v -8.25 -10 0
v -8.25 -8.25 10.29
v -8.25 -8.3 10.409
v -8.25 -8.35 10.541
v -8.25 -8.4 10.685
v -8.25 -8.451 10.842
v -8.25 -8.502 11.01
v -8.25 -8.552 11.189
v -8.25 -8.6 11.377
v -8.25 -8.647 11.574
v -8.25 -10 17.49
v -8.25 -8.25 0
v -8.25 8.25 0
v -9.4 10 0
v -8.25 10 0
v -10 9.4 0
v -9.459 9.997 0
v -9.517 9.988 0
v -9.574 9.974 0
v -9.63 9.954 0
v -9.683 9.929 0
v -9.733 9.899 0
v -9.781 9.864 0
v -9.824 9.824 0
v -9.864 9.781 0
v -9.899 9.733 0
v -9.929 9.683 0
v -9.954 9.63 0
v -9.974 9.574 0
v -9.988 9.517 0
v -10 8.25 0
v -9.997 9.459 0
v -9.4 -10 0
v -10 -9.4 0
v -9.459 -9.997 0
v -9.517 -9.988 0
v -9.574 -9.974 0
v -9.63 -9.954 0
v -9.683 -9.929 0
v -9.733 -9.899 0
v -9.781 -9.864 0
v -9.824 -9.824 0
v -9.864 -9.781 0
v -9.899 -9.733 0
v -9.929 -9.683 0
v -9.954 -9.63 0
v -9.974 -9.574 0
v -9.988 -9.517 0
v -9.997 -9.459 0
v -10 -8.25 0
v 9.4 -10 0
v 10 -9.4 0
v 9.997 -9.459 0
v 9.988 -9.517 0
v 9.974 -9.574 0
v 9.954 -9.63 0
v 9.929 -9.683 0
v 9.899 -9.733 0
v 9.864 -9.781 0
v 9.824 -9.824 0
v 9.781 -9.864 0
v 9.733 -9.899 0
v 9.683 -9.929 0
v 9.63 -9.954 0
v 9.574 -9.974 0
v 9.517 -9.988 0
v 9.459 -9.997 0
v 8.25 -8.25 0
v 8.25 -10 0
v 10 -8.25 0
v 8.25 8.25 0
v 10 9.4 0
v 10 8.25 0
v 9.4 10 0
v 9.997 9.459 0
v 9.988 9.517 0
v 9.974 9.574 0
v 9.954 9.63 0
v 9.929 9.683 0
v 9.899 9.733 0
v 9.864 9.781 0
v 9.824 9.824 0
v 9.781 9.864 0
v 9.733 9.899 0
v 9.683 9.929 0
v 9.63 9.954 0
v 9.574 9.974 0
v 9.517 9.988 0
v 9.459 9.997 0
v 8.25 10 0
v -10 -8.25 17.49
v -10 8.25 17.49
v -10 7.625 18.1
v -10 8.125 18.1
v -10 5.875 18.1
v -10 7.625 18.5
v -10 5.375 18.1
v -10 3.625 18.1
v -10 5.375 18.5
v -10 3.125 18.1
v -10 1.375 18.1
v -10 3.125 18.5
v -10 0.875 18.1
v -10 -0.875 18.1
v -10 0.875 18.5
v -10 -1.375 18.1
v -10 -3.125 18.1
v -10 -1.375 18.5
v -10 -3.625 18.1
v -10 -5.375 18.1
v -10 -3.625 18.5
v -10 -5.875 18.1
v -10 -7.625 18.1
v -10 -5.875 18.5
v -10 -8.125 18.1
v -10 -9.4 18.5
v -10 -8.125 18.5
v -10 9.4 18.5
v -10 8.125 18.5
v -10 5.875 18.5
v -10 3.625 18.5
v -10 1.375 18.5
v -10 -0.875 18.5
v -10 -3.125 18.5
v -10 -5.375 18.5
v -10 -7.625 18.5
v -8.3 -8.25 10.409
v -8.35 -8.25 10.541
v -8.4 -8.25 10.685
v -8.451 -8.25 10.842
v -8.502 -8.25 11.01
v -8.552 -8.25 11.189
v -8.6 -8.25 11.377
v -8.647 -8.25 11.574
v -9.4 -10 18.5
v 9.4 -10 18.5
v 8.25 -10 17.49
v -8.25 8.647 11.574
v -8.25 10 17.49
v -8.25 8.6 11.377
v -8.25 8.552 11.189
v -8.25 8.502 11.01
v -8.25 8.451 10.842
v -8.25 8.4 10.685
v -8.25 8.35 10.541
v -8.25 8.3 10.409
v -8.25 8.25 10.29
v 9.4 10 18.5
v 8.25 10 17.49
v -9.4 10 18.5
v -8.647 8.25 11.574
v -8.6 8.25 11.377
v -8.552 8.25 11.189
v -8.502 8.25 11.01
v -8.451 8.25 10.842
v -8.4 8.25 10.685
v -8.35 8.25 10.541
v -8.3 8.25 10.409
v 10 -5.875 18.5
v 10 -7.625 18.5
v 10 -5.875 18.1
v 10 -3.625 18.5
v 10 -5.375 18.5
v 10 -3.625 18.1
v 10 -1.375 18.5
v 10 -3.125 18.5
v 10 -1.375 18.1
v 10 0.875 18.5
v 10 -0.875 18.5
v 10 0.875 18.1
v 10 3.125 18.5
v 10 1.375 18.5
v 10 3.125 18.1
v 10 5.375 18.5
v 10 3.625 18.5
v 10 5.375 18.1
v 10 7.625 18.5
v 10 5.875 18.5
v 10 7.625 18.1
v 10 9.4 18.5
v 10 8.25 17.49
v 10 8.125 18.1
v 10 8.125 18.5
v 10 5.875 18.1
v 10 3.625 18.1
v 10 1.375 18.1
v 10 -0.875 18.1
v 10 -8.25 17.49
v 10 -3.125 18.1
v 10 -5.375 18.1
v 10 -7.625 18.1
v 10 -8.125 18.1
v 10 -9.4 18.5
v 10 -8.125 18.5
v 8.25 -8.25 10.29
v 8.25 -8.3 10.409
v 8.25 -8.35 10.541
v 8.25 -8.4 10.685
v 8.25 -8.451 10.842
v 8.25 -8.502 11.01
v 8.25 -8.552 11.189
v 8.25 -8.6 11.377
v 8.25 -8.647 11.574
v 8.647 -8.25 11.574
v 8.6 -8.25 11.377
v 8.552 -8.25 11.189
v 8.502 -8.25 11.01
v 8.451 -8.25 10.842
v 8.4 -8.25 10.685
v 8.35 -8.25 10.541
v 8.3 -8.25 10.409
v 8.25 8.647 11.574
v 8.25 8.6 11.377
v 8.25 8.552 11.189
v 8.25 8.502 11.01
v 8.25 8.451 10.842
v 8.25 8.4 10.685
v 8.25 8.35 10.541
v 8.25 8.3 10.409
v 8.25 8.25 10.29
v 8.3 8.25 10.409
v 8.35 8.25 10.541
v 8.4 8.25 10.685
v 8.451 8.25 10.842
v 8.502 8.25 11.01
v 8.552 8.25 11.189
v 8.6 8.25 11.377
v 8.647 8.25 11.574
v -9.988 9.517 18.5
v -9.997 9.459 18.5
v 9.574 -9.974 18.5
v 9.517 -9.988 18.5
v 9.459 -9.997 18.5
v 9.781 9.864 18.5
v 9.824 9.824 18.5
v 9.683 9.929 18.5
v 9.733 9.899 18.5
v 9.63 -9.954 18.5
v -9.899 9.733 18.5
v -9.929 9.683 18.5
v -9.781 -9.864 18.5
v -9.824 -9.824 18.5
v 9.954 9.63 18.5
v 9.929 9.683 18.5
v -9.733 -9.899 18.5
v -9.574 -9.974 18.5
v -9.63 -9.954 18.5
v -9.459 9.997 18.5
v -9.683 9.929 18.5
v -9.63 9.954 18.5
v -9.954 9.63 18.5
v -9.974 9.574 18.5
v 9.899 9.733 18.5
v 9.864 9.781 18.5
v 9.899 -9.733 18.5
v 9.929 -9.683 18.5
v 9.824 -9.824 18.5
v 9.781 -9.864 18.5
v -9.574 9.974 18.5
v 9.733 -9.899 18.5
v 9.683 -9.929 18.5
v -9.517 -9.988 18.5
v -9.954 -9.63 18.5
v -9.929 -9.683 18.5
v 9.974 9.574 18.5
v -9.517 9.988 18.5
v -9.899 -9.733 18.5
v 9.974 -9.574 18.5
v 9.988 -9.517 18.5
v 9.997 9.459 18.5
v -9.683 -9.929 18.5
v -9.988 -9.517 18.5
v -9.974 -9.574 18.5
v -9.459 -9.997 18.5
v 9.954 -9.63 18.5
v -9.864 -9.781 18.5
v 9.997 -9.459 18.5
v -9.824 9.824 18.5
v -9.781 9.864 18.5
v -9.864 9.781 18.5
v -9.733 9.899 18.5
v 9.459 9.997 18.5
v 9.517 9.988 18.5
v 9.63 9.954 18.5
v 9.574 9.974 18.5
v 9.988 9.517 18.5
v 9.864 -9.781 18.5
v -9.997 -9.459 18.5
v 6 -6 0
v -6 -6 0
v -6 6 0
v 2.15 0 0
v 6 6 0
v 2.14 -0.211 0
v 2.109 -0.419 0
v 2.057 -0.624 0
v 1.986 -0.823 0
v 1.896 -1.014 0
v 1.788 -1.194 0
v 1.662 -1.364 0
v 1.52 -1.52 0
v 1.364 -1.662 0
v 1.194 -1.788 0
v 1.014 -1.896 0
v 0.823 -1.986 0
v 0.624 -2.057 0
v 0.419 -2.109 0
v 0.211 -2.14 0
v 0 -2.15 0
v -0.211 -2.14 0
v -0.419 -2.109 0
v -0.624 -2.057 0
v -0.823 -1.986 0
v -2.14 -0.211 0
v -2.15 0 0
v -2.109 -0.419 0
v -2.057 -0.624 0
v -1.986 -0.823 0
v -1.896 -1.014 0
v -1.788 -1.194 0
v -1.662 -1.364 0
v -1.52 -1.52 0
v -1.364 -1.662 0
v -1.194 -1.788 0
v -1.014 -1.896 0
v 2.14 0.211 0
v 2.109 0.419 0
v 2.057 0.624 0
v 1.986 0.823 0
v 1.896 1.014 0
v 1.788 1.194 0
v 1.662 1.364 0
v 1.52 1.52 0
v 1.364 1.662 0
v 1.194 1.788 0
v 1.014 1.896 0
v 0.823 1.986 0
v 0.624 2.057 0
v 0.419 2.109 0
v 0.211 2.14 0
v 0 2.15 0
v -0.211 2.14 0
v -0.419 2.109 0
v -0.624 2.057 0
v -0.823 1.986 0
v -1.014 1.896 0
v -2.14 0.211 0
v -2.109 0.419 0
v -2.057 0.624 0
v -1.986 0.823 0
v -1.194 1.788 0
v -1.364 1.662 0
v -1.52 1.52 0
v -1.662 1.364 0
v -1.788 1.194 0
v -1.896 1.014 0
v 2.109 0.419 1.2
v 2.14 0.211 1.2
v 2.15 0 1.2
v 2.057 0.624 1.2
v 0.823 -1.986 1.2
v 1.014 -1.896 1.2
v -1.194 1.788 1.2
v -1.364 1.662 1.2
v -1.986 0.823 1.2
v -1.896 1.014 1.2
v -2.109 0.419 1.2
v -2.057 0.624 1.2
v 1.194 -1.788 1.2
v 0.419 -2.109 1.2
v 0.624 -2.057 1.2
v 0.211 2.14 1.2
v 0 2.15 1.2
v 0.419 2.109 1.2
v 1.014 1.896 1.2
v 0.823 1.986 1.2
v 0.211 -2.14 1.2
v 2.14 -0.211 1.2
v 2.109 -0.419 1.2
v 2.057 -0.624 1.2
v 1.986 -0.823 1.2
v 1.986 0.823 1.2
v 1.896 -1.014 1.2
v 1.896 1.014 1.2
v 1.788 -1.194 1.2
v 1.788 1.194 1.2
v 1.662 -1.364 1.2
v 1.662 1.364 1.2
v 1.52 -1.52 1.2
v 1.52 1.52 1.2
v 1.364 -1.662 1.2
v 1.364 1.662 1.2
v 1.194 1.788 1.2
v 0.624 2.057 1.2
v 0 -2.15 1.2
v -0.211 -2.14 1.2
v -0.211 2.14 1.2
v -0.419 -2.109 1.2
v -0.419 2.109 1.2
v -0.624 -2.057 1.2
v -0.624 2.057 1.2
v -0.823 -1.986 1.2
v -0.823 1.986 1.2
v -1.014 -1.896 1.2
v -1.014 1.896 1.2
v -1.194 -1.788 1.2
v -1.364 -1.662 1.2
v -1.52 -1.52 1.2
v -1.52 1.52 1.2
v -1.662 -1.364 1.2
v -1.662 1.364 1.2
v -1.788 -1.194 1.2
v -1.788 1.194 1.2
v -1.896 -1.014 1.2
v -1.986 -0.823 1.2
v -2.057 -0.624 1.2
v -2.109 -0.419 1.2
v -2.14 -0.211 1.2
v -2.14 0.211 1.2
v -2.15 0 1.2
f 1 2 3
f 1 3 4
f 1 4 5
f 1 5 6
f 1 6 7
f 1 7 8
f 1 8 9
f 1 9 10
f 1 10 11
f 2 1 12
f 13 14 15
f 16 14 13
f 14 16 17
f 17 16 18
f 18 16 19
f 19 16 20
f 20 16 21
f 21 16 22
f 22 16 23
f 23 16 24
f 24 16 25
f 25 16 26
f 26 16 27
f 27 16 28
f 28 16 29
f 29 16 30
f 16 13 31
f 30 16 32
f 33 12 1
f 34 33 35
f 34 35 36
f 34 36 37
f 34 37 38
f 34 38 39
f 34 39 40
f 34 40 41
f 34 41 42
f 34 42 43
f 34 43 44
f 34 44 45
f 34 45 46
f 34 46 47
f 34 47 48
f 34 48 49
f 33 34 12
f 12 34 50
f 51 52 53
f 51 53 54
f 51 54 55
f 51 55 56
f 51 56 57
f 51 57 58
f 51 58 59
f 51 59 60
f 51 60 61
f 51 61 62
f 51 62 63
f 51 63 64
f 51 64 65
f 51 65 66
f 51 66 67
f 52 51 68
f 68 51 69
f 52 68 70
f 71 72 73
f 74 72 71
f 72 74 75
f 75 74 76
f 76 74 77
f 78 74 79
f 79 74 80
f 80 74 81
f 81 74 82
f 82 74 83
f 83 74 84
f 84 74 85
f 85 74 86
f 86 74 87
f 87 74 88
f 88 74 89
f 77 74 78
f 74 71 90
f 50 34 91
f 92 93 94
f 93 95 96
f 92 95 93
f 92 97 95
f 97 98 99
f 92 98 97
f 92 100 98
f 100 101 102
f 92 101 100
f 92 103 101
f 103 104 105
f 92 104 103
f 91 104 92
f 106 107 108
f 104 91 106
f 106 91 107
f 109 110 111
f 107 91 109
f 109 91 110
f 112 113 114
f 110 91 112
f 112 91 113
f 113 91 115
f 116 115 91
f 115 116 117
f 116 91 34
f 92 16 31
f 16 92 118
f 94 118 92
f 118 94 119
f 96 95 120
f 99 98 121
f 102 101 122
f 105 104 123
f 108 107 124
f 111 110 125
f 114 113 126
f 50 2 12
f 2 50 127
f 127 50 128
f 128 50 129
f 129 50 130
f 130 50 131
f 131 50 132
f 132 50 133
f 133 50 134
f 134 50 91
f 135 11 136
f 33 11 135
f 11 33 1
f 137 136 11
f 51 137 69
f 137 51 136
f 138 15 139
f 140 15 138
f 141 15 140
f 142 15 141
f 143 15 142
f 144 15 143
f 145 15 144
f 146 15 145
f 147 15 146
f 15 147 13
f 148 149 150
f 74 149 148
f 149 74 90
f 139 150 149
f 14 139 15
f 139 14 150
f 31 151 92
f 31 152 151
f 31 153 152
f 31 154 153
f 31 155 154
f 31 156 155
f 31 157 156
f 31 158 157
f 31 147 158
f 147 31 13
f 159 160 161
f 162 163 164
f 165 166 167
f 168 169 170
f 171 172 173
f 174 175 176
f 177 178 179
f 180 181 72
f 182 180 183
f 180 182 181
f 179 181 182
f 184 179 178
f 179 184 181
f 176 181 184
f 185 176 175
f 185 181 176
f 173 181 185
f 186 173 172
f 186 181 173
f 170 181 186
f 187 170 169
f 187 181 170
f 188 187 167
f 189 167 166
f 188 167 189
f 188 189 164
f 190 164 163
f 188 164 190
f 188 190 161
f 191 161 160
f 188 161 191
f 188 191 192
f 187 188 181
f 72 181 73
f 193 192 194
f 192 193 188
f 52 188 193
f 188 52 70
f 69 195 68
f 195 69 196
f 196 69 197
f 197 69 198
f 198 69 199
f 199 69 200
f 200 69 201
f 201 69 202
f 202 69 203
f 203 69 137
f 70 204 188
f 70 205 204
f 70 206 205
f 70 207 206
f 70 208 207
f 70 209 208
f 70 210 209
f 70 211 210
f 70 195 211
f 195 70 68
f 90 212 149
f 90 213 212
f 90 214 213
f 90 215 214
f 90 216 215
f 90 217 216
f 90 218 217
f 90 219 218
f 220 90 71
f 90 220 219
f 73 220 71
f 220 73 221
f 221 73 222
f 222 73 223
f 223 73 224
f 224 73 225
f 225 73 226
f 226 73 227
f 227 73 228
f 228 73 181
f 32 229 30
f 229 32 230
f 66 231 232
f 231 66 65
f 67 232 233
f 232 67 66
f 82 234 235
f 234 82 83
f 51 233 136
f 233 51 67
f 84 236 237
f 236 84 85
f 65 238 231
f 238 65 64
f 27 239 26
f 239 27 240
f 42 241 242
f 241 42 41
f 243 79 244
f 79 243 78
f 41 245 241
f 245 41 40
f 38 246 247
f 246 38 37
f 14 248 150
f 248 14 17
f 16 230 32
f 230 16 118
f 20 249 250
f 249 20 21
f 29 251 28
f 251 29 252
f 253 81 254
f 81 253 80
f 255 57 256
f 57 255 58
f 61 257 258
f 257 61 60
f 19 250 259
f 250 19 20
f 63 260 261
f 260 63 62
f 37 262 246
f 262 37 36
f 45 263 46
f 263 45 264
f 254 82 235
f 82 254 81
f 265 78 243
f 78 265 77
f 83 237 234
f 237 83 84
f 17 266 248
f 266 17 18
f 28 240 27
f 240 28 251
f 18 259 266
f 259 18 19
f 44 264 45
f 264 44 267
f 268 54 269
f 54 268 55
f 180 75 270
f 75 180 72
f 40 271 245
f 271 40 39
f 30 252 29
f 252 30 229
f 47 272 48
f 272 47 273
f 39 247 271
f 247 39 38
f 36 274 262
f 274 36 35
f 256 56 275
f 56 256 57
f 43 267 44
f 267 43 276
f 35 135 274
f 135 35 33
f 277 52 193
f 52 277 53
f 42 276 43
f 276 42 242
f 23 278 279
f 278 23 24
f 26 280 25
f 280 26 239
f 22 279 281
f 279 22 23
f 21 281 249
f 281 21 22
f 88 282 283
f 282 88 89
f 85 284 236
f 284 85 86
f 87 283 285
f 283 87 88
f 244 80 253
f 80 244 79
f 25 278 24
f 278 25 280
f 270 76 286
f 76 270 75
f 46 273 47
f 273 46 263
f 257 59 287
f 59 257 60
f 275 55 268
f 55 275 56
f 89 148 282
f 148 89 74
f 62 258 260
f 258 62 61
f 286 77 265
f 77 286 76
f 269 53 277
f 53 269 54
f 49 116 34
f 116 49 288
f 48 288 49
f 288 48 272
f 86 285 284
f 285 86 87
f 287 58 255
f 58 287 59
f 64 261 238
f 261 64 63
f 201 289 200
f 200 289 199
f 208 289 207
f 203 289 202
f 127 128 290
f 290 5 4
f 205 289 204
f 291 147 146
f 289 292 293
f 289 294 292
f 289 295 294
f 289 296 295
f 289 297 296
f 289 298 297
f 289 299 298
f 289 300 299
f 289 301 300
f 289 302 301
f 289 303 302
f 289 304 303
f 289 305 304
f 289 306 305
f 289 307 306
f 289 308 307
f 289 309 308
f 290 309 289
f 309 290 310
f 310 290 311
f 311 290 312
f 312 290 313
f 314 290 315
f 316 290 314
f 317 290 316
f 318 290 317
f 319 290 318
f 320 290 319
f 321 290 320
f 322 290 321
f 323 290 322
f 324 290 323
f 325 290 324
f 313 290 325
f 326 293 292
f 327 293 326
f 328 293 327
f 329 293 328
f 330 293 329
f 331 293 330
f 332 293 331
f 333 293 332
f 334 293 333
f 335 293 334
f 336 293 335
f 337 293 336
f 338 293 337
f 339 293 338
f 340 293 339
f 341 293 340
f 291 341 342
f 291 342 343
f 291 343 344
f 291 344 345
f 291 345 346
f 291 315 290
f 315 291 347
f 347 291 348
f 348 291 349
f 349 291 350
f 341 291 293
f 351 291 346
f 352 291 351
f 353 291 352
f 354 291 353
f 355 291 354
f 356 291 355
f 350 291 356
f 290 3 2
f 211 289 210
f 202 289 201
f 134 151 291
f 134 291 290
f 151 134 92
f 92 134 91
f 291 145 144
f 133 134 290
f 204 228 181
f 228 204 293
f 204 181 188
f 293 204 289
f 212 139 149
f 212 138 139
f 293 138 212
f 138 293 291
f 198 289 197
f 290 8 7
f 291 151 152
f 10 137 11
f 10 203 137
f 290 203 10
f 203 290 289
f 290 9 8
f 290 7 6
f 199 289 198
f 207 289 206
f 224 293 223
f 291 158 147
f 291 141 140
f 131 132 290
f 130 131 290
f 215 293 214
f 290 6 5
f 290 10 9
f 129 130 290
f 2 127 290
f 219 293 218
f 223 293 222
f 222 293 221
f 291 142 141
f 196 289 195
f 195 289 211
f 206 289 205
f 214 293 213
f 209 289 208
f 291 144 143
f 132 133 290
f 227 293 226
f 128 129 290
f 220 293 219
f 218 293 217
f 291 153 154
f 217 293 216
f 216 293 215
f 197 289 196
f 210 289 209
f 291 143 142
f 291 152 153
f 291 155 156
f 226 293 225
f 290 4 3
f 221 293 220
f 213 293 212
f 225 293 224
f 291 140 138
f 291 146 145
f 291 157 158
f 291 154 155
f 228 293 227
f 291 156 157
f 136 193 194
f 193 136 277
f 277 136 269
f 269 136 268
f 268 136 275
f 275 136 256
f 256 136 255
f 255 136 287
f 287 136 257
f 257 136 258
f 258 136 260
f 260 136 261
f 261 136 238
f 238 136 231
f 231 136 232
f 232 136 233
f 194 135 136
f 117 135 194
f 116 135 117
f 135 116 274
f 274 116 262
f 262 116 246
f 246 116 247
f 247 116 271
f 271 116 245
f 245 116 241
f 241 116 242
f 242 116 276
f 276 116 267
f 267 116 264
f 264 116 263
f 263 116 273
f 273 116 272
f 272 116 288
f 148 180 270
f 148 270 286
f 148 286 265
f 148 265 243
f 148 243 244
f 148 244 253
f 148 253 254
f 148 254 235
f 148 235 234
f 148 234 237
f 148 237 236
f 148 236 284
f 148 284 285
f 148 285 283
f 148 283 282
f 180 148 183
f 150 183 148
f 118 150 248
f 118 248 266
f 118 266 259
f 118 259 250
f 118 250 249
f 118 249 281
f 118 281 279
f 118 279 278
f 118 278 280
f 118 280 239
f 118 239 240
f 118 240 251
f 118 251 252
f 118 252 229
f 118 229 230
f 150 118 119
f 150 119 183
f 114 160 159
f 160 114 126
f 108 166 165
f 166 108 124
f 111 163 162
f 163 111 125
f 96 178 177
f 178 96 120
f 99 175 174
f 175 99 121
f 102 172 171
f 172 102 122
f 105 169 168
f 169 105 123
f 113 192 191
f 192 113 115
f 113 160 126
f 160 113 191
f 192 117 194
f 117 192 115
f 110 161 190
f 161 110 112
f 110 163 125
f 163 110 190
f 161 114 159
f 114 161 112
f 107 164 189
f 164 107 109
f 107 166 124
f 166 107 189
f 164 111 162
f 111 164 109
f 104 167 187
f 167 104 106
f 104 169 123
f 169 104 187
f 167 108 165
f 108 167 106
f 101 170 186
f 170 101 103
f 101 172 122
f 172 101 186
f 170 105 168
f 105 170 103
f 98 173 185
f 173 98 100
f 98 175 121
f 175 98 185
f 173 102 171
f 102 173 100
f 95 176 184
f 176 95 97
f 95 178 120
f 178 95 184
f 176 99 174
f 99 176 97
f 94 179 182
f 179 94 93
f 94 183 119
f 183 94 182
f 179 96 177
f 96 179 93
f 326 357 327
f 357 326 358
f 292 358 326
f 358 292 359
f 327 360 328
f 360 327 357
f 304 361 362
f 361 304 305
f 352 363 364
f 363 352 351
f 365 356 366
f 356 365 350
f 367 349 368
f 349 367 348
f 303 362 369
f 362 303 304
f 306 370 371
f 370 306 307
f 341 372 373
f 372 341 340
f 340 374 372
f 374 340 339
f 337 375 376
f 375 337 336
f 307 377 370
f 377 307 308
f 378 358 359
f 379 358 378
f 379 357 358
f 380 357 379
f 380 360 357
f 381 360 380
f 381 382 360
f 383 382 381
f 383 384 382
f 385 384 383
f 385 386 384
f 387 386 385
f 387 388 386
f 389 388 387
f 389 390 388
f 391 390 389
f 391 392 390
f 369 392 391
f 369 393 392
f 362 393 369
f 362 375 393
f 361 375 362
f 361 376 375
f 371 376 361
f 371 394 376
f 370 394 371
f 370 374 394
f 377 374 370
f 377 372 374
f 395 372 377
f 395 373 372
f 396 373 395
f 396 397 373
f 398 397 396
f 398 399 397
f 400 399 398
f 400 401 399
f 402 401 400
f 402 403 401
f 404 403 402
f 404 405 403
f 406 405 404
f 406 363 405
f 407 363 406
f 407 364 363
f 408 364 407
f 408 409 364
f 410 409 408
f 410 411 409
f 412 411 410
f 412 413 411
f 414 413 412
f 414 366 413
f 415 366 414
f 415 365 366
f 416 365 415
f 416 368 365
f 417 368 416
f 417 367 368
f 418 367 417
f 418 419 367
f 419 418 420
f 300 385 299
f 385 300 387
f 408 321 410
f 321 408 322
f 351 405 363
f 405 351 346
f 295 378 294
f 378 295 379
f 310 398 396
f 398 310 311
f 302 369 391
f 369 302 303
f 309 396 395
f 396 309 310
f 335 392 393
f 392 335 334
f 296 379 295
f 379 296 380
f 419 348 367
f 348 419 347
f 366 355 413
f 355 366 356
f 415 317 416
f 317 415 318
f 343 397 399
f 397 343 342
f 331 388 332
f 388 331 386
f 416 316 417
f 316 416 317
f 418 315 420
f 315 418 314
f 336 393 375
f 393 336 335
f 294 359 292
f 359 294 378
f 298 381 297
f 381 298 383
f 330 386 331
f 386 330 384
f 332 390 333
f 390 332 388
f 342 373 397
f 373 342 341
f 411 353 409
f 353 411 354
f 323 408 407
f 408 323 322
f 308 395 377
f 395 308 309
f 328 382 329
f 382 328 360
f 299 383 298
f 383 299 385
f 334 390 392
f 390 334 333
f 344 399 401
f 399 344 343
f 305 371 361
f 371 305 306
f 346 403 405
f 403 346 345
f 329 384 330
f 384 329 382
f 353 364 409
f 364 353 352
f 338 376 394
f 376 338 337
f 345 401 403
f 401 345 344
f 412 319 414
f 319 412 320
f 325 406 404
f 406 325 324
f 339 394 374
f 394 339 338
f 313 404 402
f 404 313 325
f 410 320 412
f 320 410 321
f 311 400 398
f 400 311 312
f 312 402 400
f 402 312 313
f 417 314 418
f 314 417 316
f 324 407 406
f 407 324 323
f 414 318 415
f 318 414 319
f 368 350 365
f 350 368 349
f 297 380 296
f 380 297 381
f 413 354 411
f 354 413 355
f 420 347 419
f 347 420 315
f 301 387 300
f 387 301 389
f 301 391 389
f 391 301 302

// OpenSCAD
// outdoor / table — a garden table token with a slatted top, round or square.
//
// Built support-free the way the dining table used to be (diningroom/table.scad
// now stands on a single pedestal): a thin top slab at the full footprint,
// standing on a body set well back from the edge, plus a leg at each corner
// (round tops: round legs round the rim). Only the top slab
// is full size, so it stands proud of its legs like a real table, but the body
// slopes back instead of stepping, so nothing overhangs the printer and the
// piece stays one solid block that sits flat and takes a magnet. Grooved seams
// across the top read as timber decking slats instead of a place setting, so it
// does not get mistaken for the dining table indoors.
//
// Width/Depth (or Diameter, for a round top) are the real-world top in cm, and
// Height the real height of that top — garden-table height — shrunk by the plan
// scale like the footprint (see printed_h() in lib/common.scad), the same as
// diningroom/table.scad.

include <../lib/common.scad>

Round    = false;  // true -> a round top of Diameter; Width/Depth are ignored
Width    = 80;     // cm
Depth    = 80;     // cm
Diameter = 90;     // cm, round tops only
Height   = 74;     // cm — garden-table height

// the printed height, mm: Height at the plan scale
Print_h = printed_h(Height);

// The top slab, in real cm — the only part of the token at full footprint, so its
// edge is the line you read the size off.
Top_h = 4;
// How far the body under the top is set back from the edge, in real cm. It stands
// in for the empty space under a real table, so the further back the better it
// reads — but it is a slope, not a step, and it is clamped below (see table()).
Setback = 16;
// A leg at each corner of the top (round tops: four round ones round the rim),
// Leg cm square. Legs stand vertically, flush with the edge of the top, so the
// corners read solid while the sides slope away.
Show_legs = true;
Leg       = 7;   // cm

// Parallel grooves across the top, standing in for the seams between decking
// boards. Slat_pitch is the real-world seam-to-seam spacing (one board's width);
// Slat_groove is how wide each seam is cut — 2 cm here is 0.5 mm printed, a hair
// over one nozzle, as a symbol stroke is; Slat_margin keeps the outermost seams off
// the rim (and clear of a rounded corner).
Show_slats  = true;
Slat_pitch  = 9;   // cm
Slat_groove = 2;   // cm
Slat_margin = 6;   // cm

// Magnet pocket in the bottom face — this top is small and square/round, so one
// central pocket is enough to keep it from pivoting; see Magnet_* in
// lib/common.scad.
Magnets = 1;

table();

module table() {
    // one pair of dimensions for both shapes — a round top is Diameter x Diameter
    w      = Round ? Diameter : Width;
    d      = Round ? Diameter : Depth;
    body_h = Print_h - rise(Top_h);
    // The set-back is clamped two ways, so one number works on any size and height:
    // it may not lean out more than 45 deg (body_h), which is what keeps the slope
    // printable without support, and it must leave a base wide enough to stand on
    // and to take a magnet pocket.
    base_min = magnet_min_span(magnet_d_for(w, d));
    back     = max(0, min(cm(Setback), body_h, (min(cm(w), cm(d)) - base_min) / 2));
    difference() {
        union() {
            // the body: full footprint where it meets the top, set back at the floor
            hull() {
                linear_extrude(height = 0.01)
                    offset(delta = -back) top_2d();
                translate([0, 0, body_h - 0.01])
                    linear_extrude(height = 0.01) top_2d();
            }
            if (Show_legs)
                legs(body_h);
            translate([0, 0, body_h])
                linear_extrude(height = rise(Top_h)) top_2d();
        }
        if (Show_slats)
            slats(Print_h);
        if (Magnets > 0)
            magnets(w, d, Magnets);
    }
}

// The outline of the top — everything else is built from it.
module top_2d() {
    if (Round) footprint_round_2d(Diameter);
    else       footprint_2d(Width, Depth);
}

// Legs, <h> mm tall, clipped to the outline so a rounded corner stays rounded.
module legs(h) {
    intersection() {
        linear_extrude(height = h) top_2d();
        union() {
            if (Round)
                for (a = [45 : 90 : 315])
                    translate((cm(Diameter) - cm(Leg)) / 2 * [cos(a), sin(a)])
                        cylinder(h = h, d = cm(Leg));
            else
                for (x = [-1, 1], y = [-1, 1])
                    translate([x * (cm(Width) - cm(Leg)) / 2,
                               y * (cm(Depth) - cm(Leg)) / 2, h / 2])
                        cube([cm(Leg), cm(Leg), h], center = true);
        }
    }
}

// Parallel seams across the top, standing in for the gaps between decking
// boards, spaced Slat_pitch cm apart and kept Slat_margin cm off the rim — the
// same spread-with-margin idea as magnets(). Each line is cut as wide as the top
// itself; on a round top that overshoots the chord at that seam, but a groove
// only removes material where there is some, so it is clipped for free by the
// disc outline. Subtract it from the top face like groove():
//   difference() { footprint(80, 80, 6); slats(6); }
module slats(top_z, depth = Label_depth) {
    w      = Round ? Diameter : Width;
    d      = Round ? Diameter : Depth;
    usable = d - 2 * Slat_margin;
    n      = max(1, floor(usable / Slat_pitch) + 1);
    span   = (n - 1) * Slat_pitch;
    for (i = [0 : n - 1]) {
        y = n > 1 ? -span / 2 + i * Slat_pitch : 0;
        groove(0, y, w, Slat_groove, top_z, depth);
    }
}
